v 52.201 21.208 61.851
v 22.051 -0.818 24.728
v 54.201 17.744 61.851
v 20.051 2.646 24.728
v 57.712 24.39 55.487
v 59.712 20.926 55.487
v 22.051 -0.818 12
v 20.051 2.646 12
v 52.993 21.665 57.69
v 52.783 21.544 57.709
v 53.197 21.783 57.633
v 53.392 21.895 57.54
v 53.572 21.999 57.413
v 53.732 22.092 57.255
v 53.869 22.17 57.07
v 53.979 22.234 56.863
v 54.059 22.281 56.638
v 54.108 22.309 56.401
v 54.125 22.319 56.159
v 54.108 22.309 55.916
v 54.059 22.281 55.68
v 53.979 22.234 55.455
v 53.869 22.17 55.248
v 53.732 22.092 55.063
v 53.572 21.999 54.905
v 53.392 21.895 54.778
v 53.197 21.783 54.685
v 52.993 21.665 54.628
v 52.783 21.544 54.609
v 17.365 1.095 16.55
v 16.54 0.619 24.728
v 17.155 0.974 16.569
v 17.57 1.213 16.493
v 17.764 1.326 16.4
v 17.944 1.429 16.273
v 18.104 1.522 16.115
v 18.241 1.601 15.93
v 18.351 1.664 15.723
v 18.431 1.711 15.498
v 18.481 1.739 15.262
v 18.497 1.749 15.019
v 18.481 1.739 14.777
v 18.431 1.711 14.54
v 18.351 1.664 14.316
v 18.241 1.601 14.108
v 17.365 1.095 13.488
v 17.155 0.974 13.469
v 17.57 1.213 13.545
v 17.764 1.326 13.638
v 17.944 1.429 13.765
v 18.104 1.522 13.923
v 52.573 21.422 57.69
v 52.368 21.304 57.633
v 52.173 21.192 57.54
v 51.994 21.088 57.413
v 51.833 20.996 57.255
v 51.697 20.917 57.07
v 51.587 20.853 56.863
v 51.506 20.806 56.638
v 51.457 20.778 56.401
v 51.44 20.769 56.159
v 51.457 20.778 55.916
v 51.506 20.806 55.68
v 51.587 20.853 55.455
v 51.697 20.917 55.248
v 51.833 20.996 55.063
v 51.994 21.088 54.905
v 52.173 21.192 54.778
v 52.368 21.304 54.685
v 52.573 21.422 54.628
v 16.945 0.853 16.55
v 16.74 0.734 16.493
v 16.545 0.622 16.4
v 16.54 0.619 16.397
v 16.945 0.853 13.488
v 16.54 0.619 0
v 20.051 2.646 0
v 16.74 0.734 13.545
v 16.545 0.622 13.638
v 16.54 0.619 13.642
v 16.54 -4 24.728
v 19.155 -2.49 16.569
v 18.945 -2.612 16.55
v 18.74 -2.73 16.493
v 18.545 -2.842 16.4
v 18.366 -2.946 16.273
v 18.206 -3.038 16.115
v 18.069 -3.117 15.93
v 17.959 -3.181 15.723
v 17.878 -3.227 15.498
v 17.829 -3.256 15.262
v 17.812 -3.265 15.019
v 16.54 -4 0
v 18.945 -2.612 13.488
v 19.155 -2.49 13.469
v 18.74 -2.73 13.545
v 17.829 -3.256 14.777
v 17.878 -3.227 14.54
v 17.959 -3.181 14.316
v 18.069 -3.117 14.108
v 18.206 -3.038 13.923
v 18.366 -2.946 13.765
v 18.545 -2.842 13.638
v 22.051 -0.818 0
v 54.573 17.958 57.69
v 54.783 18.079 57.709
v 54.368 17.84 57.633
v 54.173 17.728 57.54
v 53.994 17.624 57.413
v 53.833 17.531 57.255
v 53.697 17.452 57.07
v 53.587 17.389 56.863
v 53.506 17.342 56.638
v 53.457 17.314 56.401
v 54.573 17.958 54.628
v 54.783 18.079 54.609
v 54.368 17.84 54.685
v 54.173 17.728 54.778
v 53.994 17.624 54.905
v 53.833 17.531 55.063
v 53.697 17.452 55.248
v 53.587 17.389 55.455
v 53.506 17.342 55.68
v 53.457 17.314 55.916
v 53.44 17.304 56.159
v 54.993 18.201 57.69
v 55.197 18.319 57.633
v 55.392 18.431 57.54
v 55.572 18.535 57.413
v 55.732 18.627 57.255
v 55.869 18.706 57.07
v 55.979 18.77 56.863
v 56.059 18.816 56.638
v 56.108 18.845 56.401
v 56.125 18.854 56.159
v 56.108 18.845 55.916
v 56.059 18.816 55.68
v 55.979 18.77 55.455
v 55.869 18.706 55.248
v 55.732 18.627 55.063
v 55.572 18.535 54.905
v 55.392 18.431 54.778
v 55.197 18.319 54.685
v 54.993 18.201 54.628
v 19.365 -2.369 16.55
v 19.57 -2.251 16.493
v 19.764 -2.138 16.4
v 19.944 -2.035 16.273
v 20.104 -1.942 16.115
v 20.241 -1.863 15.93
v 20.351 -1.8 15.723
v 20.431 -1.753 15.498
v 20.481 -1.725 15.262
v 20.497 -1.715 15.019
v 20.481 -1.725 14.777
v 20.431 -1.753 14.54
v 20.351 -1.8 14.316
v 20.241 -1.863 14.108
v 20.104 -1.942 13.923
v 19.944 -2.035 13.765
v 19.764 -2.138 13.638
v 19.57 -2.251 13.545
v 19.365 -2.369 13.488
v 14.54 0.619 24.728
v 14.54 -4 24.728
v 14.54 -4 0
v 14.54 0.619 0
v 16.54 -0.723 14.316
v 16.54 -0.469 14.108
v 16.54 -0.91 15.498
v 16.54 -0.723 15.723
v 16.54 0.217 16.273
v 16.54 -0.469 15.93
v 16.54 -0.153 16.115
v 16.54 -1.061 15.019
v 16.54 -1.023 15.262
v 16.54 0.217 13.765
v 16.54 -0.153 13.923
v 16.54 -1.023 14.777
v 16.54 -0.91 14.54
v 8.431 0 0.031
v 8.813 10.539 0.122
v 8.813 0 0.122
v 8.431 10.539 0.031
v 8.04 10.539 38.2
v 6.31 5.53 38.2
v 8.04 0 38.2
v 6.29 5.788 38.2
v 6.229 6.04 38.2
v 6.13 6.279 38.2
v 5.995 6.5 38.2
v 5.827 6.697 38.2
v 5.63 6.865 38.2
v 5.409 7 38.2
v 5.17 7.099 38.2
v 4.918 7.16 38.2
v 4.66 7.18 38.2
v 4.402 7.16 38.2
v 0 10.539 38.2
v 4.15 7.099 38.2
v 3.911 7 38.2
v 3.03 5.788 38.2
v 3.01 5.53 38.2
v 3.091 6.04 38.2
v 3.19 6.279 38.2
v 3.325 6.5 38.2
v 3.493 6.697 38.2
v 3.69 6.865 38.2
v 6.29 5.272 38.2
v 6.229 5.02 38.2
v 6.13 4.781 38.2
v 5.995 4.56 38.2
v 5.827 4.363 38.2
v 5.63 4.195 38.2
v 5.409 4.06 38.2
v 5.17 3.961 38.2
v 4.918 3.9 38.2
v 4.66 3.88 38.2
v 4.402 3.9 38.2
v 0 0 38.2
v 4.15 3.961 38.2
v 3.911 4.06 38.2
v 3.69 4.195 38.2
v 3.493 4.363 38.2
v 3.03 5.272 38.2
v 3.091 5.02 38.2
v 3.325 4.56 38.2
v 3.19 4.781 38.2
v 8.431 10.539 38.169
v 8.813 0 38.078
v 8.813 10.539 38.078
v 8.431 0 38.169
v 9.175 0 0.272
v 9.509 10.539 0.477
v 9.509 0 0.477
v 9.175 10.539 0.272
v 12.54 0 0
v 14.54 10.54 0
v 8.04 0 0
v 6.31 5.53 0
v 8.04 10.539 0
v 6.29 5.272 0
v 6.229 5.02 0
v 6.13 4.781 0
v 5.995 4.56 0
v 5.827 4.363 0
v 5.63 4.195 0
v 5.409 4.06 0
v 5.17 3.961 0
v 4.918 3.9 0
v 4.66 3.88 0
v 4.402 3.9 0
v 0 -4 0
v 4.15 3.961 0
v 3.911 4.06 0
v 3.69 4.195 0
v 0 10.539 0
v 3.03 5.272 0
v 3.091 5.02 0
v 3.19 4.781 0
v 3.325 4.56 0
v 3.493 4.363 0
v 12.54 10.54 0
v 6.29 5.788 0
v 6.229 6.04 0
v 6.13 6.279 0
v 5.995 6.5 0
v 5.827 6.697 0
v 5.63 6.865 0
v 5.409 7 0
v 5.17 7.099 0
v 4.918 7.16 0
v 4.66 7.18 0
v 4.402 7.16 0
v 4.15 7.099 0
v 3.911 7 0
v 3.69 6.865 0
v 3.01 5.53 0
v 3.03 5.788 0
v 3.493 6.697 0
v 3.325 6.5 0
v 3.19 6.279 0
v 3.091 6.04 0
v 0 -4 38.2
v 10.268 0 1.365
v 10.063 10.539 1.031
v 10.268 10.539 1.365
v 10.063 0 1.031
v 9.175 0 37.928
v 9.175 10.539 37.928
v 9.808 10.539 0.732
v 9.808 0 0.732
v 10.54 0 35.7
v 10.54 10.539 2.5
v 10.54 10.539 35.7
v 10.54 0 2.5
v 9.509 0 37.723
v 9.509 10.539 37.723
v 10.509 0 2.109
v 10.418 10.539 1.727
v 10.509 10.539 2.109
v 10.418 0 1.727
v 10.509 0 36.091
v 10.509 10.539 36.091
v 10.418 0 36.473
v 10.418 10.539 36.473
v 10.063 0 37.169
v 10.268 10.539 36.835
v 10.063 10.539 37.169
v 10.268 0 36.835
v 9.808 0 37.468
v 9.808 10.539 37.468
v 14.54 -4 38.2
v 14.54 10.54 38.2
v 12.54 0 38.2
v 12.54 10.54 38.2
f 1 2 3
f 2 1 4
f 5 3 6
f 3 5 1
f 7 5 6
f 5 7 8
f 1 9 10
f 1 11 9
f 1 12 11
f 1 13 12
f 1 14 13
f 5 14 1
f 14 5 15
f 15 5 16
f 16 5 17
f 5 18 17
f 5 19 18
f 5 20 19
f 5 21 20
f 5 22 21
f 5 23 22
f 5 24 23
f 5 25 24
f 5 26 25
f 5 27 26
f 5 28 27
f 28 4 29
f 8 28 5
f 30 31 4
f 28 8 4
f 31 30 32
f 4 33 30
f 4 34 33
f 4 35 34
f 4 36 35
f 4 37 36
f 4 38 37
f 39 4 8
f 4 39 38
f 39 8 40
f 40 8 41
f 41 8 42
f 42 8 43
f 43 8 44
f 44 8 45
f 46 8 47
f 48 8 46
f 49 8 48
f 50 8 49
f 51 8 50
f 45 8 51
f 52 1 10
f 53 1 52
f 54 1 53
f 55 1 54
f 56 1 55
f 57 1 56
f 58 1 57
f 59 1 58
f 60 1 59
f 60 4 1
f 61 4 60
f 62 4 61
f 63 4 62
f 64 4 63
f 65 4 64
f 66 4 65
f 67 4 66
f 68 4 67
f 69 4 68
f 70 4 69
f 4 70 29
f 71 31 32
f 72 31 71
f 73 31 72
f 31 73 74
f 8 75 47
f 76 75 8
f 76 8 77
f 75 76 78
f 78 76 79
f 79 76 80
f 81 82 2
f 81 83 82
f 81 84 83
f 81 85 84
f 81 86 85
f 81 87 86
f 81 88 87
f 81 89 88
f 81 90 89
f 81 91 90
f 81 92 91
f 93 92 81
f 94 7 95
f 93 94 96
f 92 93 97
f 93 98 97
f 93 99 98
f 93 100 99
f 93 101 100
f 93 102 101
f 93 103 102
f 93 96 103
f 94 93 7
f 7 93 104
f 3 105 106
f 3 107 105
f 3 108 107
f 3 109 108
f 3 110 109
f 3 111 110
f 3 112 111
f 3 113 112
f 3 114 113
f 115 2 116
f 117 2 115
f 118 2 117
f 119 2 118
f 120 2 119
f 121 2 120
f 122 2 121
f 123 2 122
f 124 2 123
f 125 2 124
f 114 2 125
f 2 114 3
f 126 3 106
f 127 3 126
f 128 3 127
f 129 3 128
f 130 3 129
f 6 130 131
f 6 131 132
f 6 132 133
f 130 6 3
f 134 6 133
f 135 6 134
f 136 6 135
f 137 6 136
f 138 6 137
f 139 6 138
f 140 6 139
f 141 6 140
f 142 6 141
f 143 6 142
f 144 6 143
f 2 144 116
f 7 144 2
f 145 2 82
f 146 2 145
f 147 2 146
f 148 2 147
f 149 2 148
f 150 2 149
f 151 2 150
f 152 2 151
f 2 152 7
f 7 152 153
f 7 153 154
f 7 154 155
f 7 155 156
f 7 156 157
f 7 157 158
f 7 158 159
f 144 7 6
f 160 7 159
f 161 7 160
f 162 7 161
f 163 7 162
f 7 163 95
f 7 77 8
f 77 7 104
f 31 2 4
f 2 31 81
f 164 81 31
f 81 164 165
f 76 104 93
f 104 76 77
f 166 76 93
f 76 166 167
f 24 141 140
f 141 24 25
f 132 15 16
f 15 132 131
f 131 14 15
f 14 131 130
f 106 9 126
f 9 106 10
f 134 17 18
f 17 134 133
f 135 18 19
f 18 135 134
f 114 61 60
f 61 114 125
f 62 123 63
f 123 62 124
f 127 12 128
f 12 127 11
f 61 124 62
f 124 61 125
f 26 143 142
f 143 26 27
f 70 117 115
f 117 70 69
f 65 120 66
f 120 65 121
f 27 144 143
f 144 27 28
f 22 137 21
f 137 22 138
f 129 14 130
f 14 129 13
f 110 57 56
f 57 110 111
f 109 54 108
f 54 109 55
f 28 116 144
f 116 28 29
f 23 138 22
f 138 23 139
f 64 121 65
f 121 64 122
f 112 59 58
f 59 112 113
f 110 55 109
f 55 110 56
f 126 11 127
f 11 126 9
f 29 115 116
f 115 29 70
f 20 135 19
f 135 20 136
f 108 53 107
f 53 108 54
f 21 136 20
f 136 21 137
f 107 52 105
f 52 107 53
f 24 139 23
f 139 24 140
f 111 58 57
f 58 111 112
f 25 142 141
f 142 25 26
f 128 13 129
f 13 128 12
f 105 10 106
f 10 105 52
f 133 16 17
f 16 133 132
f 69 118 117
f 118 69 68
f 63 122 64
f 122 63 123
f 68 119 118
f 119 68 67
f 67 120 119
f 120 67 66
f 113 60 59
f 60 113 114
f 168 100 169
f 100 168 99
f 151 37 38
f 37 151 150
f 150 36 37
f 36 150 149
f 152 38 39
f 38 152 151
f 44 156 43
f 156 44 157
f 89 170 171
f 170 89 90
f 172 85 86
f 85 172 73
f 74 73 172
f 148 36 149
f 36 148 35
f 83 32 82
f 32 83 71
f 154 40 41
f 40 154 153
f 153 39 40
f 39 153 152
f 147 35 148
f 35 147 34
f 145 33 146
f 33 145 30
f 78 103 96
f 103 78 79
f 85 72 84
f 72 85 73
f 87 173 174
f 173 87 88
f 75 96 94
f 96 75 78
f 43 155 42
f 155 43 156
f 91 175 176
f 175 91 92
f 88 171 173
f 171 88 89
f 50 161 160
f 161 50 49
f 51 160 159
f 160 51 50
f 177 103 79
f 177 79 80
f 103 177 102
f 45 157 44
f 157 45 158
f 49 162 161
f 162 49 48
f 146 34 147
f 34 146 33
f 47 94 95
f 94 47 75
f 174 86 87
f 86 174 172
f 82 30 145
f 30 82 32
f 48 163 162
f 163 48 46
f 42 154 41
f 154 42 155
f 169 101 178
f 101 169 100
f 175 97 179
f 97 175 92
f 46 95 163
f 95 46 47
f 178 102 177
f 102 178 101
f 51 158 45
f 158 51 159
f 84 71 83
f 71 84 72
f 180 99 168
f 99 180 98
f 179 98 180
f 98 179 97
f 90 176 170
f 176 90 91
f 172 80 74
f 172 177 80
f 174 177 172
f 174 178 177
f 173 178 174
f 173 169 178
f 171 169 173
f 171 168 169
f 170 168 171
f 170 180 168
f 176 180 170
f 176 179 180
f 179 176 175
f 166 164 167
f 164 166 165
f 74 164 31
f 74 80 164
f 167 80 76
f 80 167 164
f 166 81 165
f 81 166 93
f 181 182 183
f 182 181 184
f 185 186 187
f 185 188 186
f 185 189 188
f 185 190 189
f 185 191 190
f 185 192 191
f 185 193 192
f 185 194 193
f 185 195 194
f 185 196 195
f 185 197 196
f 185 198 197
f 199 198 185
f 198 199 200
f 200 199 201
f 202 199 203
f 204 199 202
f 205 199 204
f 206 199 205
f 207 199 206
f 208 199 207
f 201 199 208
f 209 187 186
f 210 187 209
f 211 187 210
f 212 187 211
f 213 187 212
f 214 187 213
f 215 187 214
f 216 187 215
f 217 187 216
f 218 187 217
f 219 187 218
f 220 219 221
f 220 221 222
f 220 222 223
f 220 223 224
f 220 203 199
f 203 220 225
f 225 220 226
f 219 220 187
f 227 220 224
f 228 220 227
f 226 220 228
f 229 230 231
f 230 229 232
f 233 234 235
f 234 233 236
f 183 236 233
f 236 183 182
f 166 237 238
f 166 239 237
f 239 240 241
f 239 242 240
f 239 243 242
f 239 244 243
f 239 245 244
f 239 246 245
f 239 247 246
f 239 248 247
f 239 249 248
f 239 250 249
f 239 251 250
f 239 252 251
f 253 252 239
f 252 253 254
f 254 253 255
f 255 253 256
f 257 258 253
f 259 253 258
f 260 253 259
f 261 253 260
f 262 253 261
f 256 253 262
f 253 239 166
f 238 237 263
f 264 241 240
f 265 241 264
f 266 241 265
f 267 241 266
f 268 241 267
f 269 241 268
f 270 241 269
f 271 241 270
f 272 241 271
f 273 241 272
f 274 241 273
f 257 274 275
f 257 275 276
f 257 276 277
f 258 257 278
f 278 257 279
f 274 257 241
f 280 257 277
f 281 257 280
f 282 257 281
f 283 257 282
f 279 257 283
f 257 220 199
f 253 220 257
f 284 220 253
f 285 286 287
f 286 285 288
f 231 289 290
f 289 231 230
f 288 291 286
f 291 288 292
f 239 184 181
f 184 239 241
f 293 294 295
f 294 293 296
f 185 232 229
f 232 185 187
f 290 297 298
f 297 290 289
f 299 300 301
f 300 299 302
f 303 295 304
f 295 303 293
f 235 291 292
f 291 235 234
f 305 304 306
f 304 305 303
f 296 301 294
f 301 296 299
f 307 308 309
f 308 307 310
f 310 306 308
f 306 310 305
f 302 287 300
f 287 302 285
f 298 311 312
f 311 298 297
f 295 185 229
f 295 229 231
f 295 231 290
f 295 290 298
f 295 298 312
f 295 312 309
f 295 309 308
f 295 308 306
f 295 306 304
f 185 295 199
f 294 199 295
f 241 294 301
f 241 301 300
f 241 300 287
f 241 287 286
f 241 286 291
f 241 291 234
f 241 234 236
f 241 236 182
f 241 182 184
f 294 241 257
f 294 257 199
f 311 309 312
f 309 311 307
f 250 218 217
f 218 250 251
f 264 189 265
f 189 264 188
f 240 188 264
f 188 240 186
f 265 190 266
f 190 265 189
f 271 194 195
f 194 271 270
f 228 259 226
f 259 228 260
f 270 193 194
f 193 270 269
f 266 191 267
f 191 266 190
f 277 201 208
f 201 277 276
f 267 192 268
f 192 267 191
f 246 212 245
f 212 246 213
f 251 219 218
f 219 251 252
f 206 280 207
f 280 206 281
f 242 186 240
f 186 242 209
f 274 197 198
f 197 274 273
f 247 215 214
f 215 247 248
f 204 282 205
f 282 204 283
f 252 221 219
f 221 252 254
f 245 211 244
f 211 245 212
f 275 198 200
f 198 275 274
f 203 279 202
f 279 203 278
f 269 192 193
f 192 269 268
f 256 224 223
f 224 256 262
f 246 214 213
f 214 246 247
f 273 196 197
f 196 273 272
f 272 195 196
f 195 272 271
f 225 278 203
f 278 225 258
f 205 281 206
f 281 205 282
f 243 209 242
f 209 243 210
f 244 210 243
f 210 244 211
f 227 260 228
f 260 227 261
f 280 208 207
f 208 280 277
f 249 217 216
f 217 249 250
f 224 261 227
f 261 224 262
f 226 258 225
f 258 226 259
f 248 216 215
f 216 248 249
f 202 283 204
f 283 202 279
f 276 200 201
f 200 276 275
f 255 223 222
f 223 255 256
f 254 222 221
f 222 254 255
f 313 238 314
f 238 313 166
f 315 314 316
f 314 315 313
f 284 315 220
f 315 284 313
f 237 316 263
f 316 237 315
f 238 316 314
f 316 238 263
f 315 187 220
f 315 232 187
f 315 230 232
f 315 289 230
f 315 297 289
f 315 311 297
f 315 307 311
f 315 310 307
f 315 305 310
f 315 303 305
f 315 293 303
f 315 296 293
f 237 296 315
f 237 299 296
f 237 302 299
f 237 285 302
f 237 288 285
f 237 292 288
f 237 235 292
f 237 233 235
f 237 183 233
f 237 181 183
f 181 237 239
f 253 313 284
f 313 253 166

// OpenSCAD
clamping_block_height = 38.2;
clamping_block_width = 10.54;
clamping_block_length = 10.54;
clamping_corner_radius = 2.5;
clamping_screw_diameter = 3.3;
clamping_screw_pos_front = 5.53;
clamping_screw_gap_front = 5.88;

bottom_block_width = 2;
bottom_block_length = clamping_block_length;
bottom_block_height = clamping_block_height;
bottom_block_gap_thickness = 2;

connector_plate_length = 4;
connector_plate_width = clamping_block_width + bottom_block_gap_thickness + bottom_block_width;
connector_plate_height = clamping_block_height;

module clampingBlock() {
    // clamp
    difference() {
        translate([0,clamping_block_length-0.001,0]) rotate([90]) linear_extrude(height=clamping_block_length) {
        translate([clamping_corner_radius,clamping_corner_radius]) offset(r=clamping_corner_radius, $fn=40) square([clamping_block_width-2*clamping_corner_radius,clamping_block_height-2*clamping_corner_radius]);
        square([clamping_block_width-clamping_corner_radius,clamping_block_height]);
        }
        // screw hole
        translate([clamping_block_width-clamping_screw_gap_front,clamping_screw_pos_front,0]) cylinder(d=clamping_screw_diameter,h=clamping_block_height, $fn=40);
    }
    
    // bottom block
    translate([clamping_block_width+bottom_block_gap_thickness,0,0]) cube([bottom_block_width,bottom_block_length,bottom_block_height]);
    
    // connector_plate
    translate([0,-connector_plate_length,0]) cube([connector_plate_width,connector_plate_length,connector_plate_height]);
}    

blower_connector_length = 61.5;
blower_connector_thickness = 4;
blower_connector_width = 9;
blower_connector_angle_mount = 45;
blower_connector_angle_airflow = 30;
blower_connector_screw_diameter = 3.1;
blower_connector_screw_distance = 58.18;
blower_connector_screw_pos_right = 2;
blower_connector_pos_bottom = 12;


blower_plate_1_b = blower_connector_width*tan(blower_connector_angle_mount);
blower_plate_1_height = sqrt(pow(blower_plate_1_b,2) + pow(blower_connector_width,2));
blower_plate_1_width = sqrt(pow(blower_connector_width,2) - pow(blower_plate_1_height/2,2));
echo("blower_plate_1_height: ",blower_plate_1_height);
echo("blower_plate_1_width: ",blower_plate_1_width);

blower_plate_2_a = blower_connector_thickness*tan(blower_connector_angle_airflow);
blower_plate_2_length = sqrt(pow(blower_plate_2_a,2) + pow(blower_connector_thickness,2));
blower_plate_2_width =  sqrt(pow(blower_connector_thickness,2) - pow((blower_connector_thickness*cos(blower_connector_angle_airflow)),2));

echo("blower_plate_2_a: ",blower_plate_2_a);
echo("blower_plate_2_length: ",blower_plate_2_length);
echo("blower_plate_2_width: ",blower_plate_2_width);

module blowerScrewHoles() {
    translate([blower_plate_1_width,0,blower_connector_pos_bottom]) rotate([0,360-blower_connector_angle_mount,0])   {
            translate([blower_connector_length-blower_connector_screw_diameter/2-blower_connector_screw_pos_right,0,blower_connector_width/2]) rotate([270,0,0]) cylinder(d=blower_connector_screw_diameter,h=blower_connector_thickness+0.01, $fn=40);
        translate([blower_connector_length-blower_connector_screw_diameter/2-blower_connector_screw_pos_right-blower_connector_screw_distance,0,blower_connector_width/2]) rotate([270,0,0]) cylinder(d=blower_connector_screw_diameter,h=blower_connector_thickness+0.01, $fn=40);
    }
}    

module blowerMountPlate() {
    cube([blower_connector_length, blower_connector_thickness, blower_connector_width]);
}    

module blowerConnector() {
    translate([blower_plate_2_width,0,0]) {
        rotate([0,0,blower_connector_angle_airflow]) {
            difference() {
            union() {
            translate([blower_plate_1_width,0,blower_connector_pos_bottom]) rotate([0,360-blower_connector_angle_mount,0])   blowerMountPlate();
            cube([blower_plate_1_width,blower_connector_thickness,blower_plate_1_height+blower_connector_pos_bottom]);
            }
            blowerScrewHoles();
            }
        }
        translate([-blower_plate_2_width,0,0]) cube([blower_plate_2_width,blower_plate_2_length,blower_plate_1_height+blower_connector_pos_bottom]);
    }    
}   


module cornerEnforcement(height, radius) {
    difference() {
        cube([radius,radius,height]);
        translate([radius+0.001,radius+0.001,0]) cylinder(d=2*radius, h=height, $fn=40);
    }
}    

translate([connector_plate_width,-connector_plate_length,0]) blowerConnector();

clampingBlock();
